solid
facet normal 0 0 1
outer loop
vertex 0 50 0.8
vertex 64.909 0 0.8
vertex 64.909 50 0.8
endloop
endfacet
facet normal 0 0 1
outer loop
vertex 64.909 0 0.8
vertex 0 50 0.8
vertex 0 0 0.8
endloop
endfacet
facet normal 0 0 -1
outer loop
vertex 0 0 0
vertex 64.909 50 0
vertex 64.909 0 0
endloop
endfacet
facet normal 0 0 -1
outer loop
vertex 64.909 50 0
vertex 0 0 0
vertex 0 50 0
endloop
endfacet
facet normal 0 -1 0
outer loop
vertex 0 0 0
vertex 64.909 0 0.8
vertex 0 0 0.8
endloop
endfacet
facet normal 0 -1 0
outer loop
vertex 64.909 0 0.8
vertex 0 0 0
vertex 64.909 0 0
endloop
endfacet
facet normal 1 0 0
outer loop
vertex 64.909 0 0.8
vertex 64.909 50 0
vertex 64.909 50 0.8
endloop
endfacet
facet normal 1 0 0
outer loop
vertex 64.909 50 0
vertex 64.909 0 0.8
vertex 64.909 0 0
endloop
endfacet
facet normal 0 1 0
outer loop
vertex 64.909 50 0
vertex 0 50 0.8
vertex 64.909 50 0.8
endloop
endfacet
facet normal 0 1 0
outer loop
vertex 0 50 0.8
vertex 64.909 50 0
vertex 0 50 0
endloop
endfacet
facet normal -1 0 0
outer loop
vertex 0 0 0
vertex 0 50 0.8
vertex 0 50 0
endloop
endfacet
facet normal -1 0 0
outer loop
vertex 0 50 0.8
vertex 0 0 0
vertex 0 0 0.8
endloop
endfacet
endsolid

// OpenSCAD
//  somewhat rough OpenSCAD lithophane - scruss, 2019-10
// infile  = "479px-Muhammad_Ali_NYWTS.png";    // input image, PNG greyscale best
// infile  = "479px-Muhammad_Ali_NYWTS.png";    // input image, PNG greyscale best
// infile = "640x493-bw-brianna.png";
//infile = "640x480-bw-BriAndJon.png";
//infile = "320x240-bw-BriAndJon.png";
//infile = "640x853-bw-BriAlone.png";
//infile = "512x683-bw-BriAlone.png";
//infile = "480x640-bw-BriAlone.png";
infile = "640x493-bw-GRADE10.png";

 x_px    = 640;  // input image width,  pixels
 y_px    = 493;  // input image height, pixels
 z_min   = 0.8;  // minimum output thickness, mm
 z_max   = 3;    // maximum output thickness, mm
 y_size  = 50;   // output image height, mm
 // don't need to modify anything below here
 echo ("\n\nnumber of bits ", x_px, "x", y_px, " = ", x_px*y_px / 1000, "K bytes\n\n");
 translate([0, 0, z_max])
 scale([y_size / y_px, y_size / y_px, (z_max - z_min)/100])
 surface(file = infile, invert = true);
 cube([x_px * y_size / y_px, y_size, z_min]);
